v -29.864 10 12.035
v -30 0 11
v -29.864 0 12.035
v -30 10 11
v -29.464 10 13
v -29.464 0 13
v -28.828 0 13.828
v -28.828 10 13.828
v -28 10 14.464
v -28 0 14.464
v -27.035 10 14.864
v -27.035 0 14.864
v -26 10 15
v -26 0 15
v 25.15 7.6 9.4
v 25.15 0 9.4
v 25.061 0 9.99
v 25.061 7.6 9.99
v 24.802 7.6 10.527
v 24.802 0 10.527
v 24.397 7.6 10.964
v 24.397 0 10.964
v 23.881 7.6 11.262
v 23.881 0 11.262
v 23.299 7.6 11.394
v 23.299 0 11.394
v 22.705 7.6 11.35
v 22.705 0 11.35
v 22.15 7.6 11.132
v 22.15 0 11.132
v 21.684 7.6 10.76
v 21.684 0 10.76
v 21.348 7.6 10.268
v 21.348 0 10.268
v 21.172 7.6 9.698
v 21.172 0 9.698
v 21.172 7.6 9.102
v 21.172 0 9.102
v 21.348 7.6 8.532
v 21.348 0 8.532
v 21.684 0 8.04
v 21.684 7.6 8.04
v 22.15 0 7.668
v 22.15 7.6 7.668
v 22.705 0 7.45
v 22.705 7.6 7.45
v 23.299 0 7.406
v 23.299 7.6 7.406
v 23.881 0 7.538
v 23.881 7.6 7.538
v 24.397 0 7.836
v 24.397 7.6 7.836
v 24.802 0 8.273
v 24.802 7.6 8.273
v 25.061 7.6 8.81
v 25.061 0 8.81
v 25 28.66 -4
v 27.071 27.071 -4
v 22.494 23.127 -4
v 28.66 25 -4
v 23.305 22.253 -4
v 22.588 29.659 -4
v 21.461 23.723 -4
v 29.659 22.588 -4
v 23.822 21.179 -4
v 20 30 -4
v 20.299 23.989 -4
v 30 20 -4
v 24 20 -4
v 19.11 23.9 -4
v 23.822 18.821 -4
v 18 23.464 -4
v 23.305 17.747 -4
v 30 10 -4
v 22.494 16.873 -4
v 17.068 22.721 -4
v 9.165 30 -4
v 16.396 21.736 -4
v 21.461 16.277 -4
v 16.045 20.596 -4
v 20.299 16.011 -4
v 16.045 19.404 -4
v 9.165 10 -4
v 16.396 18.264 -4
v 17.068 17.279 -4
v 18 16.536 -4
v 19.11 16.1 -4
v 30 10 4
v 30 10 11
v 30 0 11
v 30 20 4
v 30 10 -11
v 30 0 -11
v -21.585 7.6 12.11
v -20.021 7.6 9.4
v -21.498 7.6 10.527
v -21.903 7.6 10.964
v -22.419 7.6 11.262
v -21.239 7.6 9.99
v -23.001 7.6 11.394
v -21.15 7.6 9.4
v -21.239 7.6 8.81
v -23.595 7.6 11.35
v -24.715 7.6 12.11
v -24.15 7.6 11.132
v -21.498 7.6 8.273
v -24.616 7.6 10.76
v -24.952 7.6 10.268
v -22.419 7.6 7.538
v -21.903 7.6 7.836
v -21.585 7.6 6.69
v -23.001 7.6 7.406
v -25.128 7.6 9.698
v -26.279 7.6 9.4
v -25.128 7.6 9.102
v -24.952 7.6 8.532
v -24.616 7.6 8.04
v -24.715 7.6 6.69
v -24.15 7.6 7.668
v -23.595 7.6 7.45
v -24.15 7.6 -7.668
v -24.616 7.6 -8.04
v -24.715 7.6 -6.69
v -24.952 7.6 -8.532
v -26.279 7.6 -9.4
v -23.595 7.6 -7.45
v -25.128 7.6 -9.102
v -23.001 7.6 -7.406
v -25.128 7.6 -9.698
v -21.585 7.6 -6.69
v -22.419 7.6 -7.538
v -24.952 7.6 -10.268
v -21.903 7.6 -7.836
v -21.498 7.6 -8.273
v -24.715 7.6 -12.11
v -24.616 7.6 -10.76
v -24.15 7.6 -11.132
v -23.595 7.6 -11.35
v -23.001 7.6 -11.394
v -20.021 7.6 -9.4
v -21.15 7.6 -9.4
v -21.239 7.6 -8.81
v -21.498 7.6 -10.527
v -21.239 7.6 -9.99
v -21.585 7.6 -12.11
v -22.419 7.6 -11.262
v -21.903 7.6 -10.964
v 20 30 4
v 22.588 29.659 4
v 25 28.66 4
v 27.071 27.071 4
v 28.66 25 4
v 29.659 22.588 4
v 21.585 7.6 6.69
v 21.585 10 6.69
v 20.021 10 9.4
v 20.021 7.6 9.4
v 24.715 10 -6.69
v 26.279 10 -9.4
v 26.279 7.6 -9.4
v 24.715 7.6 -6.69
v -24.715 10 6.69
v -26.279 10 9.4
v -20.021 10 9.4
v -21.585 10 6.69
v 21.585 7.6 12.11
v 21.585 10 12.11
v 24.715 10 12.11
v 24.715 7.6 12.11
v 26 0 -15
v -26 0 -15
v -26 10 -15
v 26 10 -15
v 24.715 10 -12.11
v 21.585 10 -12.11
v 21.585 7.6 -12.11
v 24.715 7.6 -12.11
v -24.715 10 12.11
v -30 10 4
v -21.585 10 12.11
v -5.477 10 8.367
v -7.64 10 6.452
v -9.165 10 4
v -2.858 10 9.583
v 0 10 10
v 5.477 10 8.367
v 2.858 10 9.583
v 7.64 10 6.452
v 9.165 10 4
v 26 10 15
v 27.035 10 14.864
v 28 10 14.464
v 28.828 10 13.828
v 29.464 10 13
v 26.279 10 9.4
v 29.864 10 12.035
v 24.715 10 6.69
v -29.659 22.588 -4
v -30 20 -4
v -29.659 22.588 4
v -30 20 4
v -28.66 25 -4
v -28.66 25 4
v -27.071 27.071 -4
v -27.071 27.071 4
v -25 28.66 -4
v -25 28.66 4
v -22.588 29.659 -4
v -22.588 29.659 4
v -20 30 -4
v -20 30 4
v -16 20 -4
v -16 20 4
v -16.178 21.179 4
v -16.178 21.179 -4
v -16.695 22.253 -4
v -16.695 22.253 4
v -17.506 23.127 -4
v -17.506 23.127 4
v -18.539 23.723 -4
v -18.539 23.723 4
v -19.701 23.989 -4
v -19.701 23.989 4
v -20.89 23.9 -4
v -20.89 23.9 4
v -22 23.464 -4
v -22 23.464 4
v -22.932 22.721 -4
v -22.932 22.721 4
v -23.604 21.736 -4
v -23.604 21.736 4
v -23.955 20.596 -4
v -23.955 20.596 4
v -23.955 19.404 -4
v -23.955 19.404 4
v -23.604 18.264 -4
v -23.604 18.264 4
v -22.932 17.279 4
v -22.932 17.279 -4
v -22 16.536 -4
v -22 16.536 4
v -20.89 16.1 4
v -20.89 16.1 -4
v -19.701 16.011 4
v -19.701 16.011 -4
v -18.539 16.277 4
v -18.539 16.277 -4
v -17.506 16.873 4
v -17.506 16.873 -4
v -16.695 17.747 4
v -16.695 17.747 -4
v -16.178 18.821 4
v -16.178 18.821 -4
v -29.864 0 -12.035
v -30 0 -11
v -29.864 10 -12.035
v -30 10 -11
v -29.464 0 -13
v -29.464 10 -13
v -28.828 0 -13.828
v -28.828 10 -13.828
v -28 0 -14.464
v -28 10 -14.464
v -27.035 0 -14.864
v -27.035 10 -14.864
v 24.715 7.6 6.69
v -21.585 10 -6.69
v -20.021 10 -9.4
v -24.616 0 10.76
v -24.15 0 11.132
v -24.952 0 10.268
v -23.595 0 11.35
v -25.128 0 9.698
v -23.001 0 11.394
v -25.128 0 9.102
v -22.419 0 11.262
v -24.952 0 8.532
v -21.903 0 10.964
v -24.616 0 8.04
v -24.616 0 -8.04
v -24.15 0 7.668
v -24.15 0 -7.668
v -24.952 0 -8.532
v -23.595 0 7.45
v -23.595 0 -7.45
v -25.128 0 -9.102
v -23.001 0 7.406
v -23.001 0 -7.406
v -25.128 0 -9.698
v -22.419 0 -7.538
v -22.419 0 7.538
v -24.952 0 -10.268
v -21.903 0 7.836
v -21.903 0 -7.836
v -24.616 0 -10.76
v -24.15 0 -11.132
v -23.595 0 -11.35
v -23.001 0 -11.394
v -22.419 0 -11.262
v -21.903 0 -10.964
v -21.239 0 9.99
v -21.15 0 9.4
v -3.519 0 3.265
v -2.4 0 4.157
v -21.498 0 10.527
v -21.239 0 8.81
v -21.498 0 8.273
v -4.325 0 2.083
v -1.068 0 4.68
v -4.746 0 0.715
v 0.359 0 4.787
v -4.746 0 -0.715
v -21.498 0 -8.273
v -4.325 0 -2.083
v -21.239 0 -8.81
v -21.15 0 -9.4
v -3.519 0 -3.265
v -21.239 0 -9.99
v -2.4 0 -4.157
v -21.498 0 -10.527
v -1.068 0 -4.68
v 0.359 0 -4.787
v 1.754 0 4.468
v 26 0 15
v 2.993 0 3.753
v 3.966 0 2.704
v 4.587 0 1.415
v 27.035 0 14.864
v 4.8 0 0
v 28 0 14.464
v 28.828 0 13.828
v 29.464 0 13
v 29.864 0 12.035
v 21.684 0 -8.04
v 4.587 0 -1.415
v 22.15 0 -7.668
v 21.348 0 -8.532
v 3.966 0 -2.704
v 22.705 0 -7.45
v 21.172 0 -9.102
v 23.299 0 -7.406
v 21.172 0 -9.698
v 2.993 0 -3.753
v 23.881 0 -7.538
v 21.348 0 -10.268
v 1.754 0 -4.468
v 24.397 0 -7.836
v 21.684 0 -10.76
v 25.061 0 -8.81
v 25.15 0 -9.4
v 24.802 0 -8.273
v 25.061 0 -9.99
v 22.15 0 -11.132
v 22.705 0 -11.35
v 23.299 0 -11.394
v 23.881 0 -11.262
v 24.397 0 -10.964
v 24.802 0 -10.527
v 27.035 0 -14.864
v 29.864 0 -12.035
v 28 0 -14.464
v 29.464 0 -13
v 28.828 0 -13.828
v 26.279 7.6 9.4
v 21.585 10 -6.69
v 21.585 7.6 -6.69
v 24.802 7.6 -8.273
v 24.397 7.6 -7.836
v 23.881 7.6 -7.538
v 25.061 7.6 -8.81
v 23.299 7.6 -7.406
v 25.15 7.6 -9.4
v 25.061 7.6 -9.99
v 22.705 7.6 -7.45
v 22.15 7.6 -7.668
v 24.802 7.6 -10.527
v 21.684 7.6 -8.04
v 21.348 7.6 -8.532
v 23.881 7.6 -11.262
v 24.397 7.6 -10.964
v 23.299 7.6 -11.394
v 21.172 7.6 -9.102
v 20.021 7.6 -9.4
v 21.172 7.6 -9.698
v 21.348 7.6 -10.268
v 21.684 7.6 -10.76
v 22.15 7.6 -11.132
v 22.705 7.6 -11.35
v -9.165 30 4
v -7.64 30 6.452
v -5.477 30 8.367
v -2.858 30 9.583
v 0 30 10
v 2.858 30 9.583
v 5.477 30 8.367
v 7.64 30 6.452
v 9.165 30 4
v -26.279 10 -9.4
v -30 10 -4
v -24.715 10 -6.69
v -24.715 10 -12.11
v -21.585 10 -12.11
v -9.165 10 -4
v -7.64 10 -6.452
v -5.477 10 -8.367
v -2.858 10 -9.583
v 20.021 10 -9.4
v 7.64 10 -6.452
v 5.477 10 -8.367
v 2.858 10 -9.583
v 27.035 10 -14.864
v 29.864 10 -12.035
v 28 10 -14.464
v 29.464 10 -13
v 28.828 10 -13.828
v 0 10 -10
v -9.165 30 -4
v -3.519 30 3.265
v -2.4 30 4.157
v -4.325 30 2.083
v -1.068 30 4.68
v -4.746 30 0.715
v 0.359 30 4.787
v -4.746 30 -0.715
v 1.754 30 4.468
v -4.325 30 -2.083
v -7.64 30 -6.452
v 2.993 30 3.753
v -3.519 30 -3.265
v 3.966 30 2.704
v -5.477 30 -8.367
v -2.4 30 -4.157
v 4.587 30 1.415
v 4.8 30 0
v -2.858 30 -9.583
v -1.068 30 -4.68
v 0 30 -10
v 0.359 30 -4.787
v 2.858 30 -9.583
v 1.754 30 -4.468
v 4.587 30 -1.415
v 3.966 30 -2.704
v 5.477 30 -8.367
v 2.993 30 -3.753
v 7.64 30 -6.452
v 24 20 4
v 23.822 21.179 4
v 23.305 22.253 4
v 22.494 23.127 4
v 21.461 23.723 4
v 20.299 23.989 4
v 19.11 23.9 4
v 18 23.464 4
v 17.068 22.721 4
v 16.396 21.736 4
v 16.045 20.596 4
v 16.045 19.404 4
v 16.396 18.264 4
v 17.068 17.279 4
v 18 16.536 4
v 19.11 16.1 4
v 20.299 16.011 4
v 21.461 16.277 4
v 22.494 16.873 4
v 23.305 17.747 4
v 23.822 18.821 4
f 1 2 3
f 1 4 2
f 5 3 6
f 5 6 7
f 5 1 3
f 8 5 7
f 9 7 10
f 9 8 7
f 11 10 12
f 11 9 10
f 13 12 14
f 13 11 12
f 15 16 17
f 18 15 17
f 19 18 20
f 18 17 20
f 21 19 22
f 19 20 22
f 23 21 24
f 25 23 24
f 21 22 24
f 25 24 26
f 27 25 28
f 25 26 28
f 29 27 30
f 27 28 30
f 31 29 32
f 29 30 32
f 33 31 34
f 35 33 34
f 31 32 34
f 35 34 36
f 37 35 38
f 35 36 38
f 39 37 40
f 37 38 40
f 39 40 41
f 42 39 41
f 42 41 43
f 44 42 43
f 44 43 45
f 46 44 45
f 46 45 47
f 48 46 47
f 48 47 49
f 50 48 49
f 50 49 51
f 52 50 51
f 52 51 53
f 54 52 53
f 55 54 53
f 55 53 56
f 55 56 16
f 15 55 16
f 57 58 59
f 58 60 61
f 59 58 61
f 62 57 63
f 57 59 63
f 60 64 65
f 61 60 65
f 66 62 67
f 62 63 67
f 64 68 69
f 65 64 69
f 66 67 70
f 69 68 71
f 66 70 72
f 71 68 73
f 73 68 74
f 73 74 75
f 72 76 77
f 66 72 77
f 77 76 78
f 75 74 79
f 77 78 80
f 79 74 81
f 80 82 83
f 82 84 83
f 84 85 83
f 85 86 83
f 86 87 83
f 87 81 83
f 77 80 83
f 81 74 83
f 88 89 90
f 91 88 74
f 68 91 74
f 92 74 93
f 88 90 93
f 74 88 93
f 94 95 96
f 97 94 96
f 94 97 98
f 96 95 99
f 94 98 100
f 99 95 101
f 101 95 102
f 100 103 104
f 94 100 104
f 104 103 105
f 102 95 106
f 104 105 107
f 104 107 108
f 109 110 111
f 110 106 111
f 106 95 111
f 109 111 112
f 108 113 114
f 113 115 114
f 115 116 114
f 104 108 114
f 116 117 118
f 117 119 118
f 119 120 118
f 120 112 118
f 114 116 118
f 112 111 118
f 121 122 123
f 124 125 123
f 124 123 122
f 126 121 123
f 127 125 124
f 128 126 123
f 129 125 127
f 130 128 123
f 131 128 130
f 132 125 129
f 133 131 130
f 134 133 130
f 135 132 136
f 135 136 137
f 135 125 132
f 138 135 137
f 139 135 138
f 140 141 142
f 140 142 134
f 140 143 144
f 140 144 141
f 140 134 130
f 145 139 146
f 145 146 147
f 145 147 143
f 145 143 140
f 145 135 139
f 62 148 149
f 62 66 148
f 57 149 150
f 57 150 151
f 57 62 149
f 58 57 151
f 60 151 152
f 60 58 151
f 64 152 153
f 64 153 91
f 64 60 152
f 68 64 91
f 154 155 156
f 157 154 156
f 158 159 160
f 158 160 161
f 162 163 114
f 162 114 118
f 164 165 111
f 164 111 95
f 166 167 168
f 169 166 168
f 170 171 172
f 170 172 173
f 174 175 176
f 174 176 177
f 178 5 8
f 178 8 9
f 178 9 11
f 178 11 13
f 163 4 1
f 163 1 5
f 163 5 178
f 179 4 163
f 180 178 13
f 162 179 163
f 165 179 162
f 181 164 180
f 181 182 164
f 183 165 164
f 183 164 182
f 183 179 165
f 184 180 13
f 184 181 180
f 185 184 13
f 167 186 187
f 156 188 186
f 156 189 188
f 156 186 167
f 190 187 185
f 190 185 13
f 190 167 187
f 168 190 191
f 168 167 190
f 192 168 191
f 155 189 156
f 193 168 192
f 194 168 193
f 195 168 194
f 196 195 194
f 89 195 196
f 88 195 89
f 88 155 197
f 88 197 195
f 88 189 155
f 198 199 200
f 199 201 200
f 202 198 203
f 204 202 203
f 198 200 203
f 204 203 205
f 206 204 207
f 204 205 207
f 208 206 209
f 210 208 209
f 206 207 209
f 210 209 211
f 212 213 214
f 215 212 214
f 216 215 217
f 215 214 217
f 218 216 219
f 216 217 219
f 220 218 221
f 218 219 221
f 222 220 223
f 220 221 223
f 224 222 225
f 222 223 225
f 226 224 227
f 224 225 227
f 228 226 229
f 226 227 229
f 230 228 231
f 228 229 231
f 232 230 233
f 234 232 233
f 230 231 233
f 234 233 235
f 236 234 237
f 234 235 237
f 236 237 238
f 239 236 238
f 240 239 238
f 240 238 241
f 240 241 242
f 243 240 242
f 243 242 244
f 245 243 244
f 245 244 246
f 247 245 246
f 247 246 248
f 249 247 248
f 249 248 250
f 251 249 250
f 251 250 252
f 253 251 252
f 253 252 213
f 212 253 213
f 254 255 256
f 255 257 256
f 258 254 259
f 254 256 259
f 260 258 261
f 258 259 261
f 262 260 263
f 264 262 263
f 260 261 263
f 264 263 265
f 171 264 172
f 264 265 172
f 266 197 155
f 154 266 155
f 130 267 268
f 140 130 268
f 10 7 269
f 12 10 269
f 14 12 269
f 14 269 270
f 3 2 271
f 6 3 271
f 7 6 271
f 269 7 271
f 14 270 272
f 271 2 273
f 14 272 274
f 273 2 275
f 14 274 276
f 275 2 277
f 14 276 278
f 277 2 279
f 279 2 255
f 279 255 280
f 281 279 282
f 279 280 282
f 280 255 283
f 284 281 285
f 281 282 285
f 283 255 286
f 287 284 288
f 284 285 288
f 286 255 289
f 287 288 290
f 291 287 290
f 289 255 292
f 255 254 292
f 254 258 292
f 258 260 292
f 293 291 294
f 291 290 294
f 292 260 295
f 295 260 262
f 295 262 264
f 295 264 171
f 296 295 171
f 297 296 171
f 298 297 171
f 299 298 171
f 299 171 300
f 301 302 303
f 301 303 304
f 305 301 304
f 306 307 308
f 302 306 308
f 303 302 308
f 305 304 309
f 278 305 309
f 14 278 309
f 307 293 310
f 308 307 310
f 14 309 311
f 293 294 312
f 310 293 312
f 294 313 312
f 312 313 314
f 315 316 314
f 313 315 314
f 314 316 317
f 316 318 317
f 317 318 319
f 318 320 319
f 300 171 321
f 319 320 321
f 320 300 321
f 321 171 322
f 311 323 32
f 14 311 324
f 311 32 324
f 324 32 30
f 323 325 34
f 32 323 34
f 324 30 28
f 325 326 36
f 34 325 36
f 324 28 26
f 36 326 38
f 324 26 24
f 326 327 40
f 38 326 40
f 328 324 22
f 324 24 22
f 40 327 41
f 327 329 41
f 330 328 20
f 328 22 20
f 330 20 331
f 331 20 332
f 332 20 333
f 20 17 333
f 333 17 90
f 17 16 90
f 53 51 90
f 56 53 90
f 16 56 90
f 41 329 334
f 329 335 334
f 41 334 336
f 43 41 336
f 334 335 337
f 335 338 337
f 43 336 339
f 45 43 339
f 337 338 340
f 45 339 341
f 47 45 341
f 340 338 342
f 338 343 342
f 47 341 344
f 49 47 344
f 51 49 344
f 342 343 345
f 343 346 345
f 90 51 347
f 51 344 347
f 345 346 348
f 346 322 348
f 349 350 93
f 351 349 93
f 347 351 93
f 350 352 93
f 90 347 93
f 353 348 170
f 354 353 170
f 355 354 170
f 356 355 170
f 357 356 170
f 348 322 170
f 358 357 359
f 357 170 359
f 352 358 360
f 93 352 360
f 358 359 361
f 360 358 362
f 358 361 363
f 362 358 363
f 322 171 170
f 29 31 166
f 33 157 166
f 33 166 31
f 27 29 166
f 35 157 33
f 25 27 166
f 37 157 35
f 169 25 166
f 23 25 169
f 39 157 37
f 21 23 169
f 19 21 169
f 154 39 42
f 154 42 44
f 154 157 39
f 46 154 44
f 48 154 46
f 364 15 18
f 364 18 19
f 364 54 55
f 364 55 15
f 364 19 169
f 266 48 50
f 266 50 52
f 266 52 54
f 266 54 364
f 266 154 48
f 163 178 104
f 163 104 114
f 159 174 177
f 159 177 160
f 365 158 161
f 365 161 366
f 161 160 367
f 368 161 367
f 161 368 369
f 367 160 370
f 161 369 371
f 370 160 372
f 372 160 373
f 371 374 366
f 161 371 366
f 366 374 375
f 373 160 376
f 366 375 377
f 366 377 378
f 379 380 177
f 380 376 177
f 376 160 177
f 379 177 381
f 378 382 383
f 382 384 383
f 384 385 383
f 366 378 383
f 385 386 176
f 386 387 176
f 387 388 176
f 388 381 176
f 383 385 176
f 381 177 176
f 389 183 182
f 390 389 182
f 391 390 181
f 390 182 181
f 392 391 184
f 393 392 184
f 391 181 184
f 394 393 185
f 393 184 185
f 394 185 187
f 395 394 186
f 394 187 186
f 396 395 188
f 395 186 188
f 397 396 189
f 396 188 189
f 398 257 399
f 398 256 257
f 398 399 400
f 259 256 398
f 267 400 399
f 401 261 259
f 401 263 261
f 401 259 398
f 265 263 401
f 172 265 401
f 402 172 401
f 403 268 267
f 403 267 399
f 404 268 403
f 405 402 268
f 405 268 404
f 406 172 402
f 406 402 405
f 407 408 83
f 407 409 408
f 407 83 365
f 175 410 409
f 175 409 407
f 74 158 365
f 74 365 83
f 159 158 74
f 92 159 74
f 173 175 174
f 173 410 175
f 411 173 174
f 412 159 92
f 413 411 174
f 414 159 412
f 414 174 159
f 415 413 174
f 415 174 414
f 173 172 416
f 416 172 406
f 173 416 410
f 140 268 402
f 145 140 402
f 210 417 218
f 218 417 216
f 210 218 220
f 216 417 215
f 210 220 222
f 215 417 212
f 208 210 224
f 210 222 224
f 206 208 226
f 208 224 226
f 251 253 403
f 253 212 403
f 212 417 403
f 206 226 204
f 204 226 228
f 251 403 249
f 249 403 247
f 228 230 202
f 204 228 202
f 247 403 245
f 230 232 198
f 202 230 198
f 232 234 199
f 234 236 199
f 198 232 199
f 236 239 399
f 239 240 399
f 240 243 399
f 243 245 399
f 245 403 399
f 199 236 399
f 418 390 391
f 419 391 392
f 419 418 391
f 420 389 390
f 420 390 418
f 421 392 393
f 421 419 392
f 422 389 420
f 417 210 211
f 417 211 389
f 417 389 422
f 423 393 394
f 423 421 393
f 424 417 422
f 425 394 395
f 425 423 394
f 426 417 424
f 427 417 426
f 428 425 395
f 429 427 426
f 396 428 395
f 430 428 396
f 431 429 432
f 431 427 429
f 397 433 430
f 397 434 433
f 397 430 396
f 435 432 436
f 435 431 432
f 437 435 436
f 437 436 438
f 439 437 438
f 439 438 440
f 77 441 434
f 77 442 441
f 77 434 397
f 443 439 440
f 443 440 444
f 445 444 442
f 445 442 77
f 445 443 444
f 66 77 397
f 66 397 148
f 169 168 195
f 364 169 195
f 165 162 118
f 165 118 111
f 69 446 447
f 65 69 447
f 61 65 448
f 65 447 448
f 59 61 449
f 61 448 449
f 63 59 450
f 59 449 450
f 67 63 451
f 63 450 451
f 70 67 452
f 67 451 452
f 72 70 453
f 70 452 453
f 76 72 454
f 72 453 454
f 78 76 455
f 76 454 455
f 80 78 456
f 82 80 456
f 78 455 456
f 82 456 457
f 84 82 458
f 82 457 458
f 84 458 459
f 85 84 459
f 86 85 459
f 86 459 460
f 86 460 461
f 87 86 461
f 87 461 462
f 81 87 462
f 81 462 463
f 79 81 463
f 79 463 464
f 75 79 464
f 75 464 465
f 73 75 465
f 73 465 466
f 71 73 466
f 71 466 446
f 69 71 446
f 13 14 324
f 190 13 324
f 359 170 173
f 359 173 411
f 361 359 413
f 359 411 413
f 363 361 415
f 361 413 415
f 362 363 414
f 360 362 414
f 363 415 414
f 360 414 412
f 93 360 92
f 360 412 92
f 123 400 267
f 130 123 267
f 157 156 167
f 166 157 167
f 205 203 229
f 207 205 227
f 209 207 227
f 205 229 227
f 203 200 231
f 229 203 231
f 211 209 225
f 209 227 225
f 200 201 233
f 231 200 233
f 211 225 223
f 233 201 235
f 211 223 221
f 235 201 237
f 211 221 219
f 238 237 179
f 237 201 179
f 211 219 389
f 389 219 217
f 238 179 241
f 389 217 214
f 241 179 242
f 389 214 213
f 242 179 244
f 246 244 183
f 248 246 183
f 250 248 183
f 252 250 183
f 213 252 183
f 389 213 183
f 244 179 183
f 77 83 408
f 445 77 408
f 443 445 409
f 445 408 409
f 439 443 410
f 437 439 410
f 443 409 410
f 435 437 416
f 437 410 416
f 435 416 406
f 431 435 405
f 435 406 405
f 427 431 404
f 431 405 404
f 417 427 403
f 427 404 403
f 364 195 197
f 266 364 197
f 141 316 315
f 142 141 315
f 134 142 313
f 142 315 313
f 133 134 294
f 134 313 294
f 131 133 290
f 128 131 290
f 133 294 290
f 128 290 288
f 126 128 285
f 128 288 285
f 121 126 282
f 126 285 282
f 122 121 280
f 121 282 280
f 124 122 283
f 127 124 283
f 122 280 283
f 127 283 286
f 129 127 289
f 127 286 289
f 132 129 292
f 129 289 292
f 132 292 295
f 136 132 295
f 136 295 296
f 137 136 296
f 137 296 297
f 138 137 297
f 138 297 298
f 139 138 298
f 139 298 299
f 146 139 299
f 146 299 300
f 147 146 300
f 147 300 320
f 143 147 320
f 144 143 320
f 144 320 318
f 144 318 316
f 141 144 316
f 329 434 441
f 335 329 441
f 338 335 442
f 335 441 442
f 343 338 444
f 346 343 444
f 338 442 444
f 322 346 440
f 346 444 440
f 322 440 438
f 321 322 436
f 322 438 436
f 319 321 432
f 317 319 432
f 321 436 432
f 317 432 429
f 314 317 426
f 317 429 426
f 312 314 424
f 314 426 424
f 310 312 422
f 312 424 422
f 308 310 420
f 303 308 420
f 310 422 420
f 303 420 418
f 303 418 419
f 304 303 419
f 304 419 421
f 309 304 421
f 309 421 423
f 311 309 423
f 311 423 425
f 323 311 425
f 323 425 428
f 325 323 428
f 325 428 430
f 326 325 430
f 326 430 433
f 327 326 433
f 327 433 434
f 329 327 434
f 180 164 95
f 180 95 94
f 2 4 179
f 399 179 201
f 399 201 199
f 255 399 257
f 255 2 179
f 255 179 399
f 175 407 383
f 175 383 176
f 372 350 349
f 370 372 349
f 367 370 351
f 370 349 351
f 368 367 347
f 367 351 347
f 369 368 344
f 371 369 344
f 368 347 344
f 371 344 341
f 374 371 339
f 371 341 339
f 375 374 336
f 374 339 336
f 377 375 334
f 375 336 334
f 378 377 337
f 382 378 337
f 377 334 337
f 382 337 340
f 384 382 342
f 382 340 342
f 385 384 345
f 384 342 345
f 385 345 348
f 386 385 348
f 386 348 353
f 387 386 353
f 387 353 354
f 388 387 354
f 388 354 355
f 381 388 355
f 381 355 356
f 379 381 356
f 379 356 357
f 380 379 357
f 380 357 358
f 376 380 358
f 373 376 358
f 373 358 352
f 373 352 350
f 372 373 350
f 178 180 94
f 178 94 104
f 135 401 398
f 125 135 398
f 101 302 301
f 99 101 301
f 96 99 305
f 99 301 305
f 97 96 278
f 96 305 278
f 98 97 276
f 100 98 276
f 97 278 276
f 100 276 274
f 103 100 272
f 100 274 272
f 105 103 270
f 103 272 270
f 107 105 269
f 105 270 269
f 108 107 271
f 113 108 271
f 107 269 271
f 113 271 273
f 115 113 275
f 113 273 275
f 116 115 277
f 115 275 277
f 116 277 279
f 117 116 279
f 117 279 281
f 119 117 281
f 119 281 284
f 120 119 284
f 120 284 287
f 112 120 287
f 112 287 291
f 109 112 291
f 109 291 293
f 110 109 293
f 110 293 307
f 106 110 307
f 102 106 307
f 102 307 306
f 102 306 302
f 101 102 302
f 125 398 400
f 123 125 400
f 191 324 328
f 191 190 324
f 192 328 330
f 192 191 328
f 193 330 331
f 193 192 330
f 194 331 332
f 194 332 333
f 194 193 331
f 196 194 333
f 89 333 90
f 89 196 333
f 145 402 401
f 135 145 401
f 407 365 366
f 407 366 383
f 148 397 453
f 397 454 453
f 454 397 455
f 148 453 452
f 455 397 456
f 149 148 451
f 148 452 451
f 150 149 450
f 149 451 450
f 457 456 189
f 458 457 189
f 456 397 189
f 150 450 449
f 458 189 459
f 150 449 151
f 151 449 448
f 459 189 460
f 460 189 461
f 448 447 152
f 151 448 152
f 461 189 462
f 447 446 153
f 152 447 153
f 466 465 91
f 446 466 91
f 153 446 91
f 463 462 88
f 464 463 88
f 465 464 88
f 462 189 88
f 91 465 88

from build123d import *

# Parameters (mm, degrees)
SKETCH2_W           = 60
SKETCH2_H           = 30
BASE_DEPTH          = 10
STRUCTURE_DEPTH     = 20
SKETCH4_R           = 4
ELASTIC_HOLES_DEPTH = 20
SKETCH5_R           = 4.8
PEN_HOLE_DEPTH      = 31
UPPER_CORNER_DEC_R  = 10
BASE_CORNER_DEC_R   = 4
SKETCH6_R           = 2
BOLT_HOLES_DEPTH    = 31
CAP_NUT_HOLES_DEPTH = 2.4


with BuildPart() as part:
    # Sketch2 → Base (new body)
    with BuildSketch(Plane(origin=(0, 0, 0), x_dir=(1, 0, 0), z_dir=(0, 1, 0))):
        Rectangle(SKETCH2_W, SKETCH2_H)
    extrude(amount=BASE_DEPTH)

    # Sketch3 → Structure (add)
    with BuildSketch(Plane(origin=(0, 10, 0), x_dir=(1, 0, 0), z_dir=(0, 1, 0))):
        with BuildLine():
            Line((-9.16515139, 4), (-30, 4))
            Line((-30, 4), (-30, -4))
            Line((-30, -4), (-9.16515139, -4))
            ThreePointArc((-9.16515139, -4), (-10, 0), (-9.16515139, 4))
        make_face()
        with BuildLine():
            ThreePointArc((9.16515139, 4), (0, 10), (-9.16515139, 4))
            Line((-9.16515139, 4), (9.16515139, 4))
        make_face()
        with BuildLine():
            Line((9.16515139, 4), (-9.16515139, 4))
            ThreePointArc((-9.16515139, 4), (-10, 0), (-9.16515139, -4))
            Line((-9.16515139, -4), (9.16515139, -4))
            ThreePointArc((9.16515139, -4), (9.789063129, -2.043096437), (10, 0))
            ThreePointArc((10, 0), (9.789063129, 2.043096437), (9.16515139, 4))
        make_face()
        with BuildLine():
            Line((9.16515139, -4), (-9.16515139, -4))
            ThreePointArc((-9.16515139, -4), (0, -10), (9.16515139, -4))
        make_face()
        with BuildLine():
            Line((30, 4), (9.16515139, 4))
            ThreePointArc((9.16515139, 4), (9.789063129, 2.043096437), (10, 0))
            ThreePointArc((10, 0), (9.789063129, -2.043096437), (9.16515139, -4))
            Line((9.16515139, -4), (30, -4))
            Line((30, -4), (30, 4))
        make_face()
    extrude(amount=STRUCTURE_DEPTH)

    # Sketch4 → Elastic Holes (cut, through all)
    with BuildSketch(Plane.XY.offset(4)):
        with Locations((-20, 20)):
            Circle(SKETCH4_R)
        with Locations((20, 20)):
            Circle(SKETCH4_R)
    extrude(amount=-ELASTIC_HOLES_DEPTH, mode=Mode.SUBTRACT)

    # Sketch5 → Pen Hole (cut, through all)
    with BuildSketch(Plane(origin=(0, 30, 0), x_dir=(1, 0, 0), z_dir=(0, 1, 0))):
        Circle(SKETCH5_R)
    extrude(amount=-PEN_HOLE_DEPTH, mode=Mode.SUBTRACT)

    # Upper Corner Dec
    upper_corner_dec_edges = [part.edges().sort_by_distance(p)[0] for p in [
        (30, 30, 0),
        (-30, 30, 0),
    ]]
    fillet(upper_corner_dec_edges, radius=UPPER_CORNER_DEC_R)

    # Base Corner Dec
    base_corner_dec_edges = [part.edges().sort_by_distance(p)[0] for p in [
        (-30, 5, -15),
        (30, 5, -15),
        (30, 5, 15),
        (-30, 5, 15),
    ]]
    fillet(base_corner_dec_edges, radius=BASE_CORNER_DEC_R)

    # Sketch6 → Bolt Holes (cut, through all)
    with BuildSketch(Plane.XZ):
        with Locations((-23.15, 9.4)):
            Circle(SKETCH6_R)
        with Locations((23.15, 9.4)):
            Circle(SKETCH6_R)
        with Locations((23.15, -9.4)):
            Circle(SKETCH6_R)
        with Locations((-23.15, -9.4)):
            Circle(SKETCH6_R)
    extrude(amount=-BOLT_HOLES_DEPTH, mode=Mode.SUBTRACT)

    # Sketch7 → Cap Nut Holes (cut)
    with BuildSketch(Plane(origin=(0, 10, 0), x_dir=(1, 0, 0), z_dir=(0, 1, 0))):
        Polygon((-21.58538077, 12.11), (-24.71461923, 12.11), (-26.279238459, 9.4), (-24.71461923, 6.69), (-21.58538077, 6.69), (-20.020761541, 9.4), align=None)
        Polygon((20.020761541, 9.4), (21.58538077, 12.11), (24.71461923, 12.11), (26.279238459, 9.4), (24.71461923, 6.69), (21.58538077, 6.69), align=None)
        Polygon((21.58538077, -12.11), (24.71461923, -12.11), (26.279238459, -9.4), (24.71461923, -6.69), (21.58538077, -6.69), (20.020761541, -9.4), align=None)
        Polygon((-20.020761541, -9.4), (-21.58538077, -12.11), (-24.71461923, -12.11), (-26.279238459, -9.4), (-24.71461923, -6.69), (-21.58538077, -6.69), align=None)
    extrude(amount=-CAP_NUT_HOLES_DEPTH, mode=Mode.SUBTRACT)


solid = part.part
